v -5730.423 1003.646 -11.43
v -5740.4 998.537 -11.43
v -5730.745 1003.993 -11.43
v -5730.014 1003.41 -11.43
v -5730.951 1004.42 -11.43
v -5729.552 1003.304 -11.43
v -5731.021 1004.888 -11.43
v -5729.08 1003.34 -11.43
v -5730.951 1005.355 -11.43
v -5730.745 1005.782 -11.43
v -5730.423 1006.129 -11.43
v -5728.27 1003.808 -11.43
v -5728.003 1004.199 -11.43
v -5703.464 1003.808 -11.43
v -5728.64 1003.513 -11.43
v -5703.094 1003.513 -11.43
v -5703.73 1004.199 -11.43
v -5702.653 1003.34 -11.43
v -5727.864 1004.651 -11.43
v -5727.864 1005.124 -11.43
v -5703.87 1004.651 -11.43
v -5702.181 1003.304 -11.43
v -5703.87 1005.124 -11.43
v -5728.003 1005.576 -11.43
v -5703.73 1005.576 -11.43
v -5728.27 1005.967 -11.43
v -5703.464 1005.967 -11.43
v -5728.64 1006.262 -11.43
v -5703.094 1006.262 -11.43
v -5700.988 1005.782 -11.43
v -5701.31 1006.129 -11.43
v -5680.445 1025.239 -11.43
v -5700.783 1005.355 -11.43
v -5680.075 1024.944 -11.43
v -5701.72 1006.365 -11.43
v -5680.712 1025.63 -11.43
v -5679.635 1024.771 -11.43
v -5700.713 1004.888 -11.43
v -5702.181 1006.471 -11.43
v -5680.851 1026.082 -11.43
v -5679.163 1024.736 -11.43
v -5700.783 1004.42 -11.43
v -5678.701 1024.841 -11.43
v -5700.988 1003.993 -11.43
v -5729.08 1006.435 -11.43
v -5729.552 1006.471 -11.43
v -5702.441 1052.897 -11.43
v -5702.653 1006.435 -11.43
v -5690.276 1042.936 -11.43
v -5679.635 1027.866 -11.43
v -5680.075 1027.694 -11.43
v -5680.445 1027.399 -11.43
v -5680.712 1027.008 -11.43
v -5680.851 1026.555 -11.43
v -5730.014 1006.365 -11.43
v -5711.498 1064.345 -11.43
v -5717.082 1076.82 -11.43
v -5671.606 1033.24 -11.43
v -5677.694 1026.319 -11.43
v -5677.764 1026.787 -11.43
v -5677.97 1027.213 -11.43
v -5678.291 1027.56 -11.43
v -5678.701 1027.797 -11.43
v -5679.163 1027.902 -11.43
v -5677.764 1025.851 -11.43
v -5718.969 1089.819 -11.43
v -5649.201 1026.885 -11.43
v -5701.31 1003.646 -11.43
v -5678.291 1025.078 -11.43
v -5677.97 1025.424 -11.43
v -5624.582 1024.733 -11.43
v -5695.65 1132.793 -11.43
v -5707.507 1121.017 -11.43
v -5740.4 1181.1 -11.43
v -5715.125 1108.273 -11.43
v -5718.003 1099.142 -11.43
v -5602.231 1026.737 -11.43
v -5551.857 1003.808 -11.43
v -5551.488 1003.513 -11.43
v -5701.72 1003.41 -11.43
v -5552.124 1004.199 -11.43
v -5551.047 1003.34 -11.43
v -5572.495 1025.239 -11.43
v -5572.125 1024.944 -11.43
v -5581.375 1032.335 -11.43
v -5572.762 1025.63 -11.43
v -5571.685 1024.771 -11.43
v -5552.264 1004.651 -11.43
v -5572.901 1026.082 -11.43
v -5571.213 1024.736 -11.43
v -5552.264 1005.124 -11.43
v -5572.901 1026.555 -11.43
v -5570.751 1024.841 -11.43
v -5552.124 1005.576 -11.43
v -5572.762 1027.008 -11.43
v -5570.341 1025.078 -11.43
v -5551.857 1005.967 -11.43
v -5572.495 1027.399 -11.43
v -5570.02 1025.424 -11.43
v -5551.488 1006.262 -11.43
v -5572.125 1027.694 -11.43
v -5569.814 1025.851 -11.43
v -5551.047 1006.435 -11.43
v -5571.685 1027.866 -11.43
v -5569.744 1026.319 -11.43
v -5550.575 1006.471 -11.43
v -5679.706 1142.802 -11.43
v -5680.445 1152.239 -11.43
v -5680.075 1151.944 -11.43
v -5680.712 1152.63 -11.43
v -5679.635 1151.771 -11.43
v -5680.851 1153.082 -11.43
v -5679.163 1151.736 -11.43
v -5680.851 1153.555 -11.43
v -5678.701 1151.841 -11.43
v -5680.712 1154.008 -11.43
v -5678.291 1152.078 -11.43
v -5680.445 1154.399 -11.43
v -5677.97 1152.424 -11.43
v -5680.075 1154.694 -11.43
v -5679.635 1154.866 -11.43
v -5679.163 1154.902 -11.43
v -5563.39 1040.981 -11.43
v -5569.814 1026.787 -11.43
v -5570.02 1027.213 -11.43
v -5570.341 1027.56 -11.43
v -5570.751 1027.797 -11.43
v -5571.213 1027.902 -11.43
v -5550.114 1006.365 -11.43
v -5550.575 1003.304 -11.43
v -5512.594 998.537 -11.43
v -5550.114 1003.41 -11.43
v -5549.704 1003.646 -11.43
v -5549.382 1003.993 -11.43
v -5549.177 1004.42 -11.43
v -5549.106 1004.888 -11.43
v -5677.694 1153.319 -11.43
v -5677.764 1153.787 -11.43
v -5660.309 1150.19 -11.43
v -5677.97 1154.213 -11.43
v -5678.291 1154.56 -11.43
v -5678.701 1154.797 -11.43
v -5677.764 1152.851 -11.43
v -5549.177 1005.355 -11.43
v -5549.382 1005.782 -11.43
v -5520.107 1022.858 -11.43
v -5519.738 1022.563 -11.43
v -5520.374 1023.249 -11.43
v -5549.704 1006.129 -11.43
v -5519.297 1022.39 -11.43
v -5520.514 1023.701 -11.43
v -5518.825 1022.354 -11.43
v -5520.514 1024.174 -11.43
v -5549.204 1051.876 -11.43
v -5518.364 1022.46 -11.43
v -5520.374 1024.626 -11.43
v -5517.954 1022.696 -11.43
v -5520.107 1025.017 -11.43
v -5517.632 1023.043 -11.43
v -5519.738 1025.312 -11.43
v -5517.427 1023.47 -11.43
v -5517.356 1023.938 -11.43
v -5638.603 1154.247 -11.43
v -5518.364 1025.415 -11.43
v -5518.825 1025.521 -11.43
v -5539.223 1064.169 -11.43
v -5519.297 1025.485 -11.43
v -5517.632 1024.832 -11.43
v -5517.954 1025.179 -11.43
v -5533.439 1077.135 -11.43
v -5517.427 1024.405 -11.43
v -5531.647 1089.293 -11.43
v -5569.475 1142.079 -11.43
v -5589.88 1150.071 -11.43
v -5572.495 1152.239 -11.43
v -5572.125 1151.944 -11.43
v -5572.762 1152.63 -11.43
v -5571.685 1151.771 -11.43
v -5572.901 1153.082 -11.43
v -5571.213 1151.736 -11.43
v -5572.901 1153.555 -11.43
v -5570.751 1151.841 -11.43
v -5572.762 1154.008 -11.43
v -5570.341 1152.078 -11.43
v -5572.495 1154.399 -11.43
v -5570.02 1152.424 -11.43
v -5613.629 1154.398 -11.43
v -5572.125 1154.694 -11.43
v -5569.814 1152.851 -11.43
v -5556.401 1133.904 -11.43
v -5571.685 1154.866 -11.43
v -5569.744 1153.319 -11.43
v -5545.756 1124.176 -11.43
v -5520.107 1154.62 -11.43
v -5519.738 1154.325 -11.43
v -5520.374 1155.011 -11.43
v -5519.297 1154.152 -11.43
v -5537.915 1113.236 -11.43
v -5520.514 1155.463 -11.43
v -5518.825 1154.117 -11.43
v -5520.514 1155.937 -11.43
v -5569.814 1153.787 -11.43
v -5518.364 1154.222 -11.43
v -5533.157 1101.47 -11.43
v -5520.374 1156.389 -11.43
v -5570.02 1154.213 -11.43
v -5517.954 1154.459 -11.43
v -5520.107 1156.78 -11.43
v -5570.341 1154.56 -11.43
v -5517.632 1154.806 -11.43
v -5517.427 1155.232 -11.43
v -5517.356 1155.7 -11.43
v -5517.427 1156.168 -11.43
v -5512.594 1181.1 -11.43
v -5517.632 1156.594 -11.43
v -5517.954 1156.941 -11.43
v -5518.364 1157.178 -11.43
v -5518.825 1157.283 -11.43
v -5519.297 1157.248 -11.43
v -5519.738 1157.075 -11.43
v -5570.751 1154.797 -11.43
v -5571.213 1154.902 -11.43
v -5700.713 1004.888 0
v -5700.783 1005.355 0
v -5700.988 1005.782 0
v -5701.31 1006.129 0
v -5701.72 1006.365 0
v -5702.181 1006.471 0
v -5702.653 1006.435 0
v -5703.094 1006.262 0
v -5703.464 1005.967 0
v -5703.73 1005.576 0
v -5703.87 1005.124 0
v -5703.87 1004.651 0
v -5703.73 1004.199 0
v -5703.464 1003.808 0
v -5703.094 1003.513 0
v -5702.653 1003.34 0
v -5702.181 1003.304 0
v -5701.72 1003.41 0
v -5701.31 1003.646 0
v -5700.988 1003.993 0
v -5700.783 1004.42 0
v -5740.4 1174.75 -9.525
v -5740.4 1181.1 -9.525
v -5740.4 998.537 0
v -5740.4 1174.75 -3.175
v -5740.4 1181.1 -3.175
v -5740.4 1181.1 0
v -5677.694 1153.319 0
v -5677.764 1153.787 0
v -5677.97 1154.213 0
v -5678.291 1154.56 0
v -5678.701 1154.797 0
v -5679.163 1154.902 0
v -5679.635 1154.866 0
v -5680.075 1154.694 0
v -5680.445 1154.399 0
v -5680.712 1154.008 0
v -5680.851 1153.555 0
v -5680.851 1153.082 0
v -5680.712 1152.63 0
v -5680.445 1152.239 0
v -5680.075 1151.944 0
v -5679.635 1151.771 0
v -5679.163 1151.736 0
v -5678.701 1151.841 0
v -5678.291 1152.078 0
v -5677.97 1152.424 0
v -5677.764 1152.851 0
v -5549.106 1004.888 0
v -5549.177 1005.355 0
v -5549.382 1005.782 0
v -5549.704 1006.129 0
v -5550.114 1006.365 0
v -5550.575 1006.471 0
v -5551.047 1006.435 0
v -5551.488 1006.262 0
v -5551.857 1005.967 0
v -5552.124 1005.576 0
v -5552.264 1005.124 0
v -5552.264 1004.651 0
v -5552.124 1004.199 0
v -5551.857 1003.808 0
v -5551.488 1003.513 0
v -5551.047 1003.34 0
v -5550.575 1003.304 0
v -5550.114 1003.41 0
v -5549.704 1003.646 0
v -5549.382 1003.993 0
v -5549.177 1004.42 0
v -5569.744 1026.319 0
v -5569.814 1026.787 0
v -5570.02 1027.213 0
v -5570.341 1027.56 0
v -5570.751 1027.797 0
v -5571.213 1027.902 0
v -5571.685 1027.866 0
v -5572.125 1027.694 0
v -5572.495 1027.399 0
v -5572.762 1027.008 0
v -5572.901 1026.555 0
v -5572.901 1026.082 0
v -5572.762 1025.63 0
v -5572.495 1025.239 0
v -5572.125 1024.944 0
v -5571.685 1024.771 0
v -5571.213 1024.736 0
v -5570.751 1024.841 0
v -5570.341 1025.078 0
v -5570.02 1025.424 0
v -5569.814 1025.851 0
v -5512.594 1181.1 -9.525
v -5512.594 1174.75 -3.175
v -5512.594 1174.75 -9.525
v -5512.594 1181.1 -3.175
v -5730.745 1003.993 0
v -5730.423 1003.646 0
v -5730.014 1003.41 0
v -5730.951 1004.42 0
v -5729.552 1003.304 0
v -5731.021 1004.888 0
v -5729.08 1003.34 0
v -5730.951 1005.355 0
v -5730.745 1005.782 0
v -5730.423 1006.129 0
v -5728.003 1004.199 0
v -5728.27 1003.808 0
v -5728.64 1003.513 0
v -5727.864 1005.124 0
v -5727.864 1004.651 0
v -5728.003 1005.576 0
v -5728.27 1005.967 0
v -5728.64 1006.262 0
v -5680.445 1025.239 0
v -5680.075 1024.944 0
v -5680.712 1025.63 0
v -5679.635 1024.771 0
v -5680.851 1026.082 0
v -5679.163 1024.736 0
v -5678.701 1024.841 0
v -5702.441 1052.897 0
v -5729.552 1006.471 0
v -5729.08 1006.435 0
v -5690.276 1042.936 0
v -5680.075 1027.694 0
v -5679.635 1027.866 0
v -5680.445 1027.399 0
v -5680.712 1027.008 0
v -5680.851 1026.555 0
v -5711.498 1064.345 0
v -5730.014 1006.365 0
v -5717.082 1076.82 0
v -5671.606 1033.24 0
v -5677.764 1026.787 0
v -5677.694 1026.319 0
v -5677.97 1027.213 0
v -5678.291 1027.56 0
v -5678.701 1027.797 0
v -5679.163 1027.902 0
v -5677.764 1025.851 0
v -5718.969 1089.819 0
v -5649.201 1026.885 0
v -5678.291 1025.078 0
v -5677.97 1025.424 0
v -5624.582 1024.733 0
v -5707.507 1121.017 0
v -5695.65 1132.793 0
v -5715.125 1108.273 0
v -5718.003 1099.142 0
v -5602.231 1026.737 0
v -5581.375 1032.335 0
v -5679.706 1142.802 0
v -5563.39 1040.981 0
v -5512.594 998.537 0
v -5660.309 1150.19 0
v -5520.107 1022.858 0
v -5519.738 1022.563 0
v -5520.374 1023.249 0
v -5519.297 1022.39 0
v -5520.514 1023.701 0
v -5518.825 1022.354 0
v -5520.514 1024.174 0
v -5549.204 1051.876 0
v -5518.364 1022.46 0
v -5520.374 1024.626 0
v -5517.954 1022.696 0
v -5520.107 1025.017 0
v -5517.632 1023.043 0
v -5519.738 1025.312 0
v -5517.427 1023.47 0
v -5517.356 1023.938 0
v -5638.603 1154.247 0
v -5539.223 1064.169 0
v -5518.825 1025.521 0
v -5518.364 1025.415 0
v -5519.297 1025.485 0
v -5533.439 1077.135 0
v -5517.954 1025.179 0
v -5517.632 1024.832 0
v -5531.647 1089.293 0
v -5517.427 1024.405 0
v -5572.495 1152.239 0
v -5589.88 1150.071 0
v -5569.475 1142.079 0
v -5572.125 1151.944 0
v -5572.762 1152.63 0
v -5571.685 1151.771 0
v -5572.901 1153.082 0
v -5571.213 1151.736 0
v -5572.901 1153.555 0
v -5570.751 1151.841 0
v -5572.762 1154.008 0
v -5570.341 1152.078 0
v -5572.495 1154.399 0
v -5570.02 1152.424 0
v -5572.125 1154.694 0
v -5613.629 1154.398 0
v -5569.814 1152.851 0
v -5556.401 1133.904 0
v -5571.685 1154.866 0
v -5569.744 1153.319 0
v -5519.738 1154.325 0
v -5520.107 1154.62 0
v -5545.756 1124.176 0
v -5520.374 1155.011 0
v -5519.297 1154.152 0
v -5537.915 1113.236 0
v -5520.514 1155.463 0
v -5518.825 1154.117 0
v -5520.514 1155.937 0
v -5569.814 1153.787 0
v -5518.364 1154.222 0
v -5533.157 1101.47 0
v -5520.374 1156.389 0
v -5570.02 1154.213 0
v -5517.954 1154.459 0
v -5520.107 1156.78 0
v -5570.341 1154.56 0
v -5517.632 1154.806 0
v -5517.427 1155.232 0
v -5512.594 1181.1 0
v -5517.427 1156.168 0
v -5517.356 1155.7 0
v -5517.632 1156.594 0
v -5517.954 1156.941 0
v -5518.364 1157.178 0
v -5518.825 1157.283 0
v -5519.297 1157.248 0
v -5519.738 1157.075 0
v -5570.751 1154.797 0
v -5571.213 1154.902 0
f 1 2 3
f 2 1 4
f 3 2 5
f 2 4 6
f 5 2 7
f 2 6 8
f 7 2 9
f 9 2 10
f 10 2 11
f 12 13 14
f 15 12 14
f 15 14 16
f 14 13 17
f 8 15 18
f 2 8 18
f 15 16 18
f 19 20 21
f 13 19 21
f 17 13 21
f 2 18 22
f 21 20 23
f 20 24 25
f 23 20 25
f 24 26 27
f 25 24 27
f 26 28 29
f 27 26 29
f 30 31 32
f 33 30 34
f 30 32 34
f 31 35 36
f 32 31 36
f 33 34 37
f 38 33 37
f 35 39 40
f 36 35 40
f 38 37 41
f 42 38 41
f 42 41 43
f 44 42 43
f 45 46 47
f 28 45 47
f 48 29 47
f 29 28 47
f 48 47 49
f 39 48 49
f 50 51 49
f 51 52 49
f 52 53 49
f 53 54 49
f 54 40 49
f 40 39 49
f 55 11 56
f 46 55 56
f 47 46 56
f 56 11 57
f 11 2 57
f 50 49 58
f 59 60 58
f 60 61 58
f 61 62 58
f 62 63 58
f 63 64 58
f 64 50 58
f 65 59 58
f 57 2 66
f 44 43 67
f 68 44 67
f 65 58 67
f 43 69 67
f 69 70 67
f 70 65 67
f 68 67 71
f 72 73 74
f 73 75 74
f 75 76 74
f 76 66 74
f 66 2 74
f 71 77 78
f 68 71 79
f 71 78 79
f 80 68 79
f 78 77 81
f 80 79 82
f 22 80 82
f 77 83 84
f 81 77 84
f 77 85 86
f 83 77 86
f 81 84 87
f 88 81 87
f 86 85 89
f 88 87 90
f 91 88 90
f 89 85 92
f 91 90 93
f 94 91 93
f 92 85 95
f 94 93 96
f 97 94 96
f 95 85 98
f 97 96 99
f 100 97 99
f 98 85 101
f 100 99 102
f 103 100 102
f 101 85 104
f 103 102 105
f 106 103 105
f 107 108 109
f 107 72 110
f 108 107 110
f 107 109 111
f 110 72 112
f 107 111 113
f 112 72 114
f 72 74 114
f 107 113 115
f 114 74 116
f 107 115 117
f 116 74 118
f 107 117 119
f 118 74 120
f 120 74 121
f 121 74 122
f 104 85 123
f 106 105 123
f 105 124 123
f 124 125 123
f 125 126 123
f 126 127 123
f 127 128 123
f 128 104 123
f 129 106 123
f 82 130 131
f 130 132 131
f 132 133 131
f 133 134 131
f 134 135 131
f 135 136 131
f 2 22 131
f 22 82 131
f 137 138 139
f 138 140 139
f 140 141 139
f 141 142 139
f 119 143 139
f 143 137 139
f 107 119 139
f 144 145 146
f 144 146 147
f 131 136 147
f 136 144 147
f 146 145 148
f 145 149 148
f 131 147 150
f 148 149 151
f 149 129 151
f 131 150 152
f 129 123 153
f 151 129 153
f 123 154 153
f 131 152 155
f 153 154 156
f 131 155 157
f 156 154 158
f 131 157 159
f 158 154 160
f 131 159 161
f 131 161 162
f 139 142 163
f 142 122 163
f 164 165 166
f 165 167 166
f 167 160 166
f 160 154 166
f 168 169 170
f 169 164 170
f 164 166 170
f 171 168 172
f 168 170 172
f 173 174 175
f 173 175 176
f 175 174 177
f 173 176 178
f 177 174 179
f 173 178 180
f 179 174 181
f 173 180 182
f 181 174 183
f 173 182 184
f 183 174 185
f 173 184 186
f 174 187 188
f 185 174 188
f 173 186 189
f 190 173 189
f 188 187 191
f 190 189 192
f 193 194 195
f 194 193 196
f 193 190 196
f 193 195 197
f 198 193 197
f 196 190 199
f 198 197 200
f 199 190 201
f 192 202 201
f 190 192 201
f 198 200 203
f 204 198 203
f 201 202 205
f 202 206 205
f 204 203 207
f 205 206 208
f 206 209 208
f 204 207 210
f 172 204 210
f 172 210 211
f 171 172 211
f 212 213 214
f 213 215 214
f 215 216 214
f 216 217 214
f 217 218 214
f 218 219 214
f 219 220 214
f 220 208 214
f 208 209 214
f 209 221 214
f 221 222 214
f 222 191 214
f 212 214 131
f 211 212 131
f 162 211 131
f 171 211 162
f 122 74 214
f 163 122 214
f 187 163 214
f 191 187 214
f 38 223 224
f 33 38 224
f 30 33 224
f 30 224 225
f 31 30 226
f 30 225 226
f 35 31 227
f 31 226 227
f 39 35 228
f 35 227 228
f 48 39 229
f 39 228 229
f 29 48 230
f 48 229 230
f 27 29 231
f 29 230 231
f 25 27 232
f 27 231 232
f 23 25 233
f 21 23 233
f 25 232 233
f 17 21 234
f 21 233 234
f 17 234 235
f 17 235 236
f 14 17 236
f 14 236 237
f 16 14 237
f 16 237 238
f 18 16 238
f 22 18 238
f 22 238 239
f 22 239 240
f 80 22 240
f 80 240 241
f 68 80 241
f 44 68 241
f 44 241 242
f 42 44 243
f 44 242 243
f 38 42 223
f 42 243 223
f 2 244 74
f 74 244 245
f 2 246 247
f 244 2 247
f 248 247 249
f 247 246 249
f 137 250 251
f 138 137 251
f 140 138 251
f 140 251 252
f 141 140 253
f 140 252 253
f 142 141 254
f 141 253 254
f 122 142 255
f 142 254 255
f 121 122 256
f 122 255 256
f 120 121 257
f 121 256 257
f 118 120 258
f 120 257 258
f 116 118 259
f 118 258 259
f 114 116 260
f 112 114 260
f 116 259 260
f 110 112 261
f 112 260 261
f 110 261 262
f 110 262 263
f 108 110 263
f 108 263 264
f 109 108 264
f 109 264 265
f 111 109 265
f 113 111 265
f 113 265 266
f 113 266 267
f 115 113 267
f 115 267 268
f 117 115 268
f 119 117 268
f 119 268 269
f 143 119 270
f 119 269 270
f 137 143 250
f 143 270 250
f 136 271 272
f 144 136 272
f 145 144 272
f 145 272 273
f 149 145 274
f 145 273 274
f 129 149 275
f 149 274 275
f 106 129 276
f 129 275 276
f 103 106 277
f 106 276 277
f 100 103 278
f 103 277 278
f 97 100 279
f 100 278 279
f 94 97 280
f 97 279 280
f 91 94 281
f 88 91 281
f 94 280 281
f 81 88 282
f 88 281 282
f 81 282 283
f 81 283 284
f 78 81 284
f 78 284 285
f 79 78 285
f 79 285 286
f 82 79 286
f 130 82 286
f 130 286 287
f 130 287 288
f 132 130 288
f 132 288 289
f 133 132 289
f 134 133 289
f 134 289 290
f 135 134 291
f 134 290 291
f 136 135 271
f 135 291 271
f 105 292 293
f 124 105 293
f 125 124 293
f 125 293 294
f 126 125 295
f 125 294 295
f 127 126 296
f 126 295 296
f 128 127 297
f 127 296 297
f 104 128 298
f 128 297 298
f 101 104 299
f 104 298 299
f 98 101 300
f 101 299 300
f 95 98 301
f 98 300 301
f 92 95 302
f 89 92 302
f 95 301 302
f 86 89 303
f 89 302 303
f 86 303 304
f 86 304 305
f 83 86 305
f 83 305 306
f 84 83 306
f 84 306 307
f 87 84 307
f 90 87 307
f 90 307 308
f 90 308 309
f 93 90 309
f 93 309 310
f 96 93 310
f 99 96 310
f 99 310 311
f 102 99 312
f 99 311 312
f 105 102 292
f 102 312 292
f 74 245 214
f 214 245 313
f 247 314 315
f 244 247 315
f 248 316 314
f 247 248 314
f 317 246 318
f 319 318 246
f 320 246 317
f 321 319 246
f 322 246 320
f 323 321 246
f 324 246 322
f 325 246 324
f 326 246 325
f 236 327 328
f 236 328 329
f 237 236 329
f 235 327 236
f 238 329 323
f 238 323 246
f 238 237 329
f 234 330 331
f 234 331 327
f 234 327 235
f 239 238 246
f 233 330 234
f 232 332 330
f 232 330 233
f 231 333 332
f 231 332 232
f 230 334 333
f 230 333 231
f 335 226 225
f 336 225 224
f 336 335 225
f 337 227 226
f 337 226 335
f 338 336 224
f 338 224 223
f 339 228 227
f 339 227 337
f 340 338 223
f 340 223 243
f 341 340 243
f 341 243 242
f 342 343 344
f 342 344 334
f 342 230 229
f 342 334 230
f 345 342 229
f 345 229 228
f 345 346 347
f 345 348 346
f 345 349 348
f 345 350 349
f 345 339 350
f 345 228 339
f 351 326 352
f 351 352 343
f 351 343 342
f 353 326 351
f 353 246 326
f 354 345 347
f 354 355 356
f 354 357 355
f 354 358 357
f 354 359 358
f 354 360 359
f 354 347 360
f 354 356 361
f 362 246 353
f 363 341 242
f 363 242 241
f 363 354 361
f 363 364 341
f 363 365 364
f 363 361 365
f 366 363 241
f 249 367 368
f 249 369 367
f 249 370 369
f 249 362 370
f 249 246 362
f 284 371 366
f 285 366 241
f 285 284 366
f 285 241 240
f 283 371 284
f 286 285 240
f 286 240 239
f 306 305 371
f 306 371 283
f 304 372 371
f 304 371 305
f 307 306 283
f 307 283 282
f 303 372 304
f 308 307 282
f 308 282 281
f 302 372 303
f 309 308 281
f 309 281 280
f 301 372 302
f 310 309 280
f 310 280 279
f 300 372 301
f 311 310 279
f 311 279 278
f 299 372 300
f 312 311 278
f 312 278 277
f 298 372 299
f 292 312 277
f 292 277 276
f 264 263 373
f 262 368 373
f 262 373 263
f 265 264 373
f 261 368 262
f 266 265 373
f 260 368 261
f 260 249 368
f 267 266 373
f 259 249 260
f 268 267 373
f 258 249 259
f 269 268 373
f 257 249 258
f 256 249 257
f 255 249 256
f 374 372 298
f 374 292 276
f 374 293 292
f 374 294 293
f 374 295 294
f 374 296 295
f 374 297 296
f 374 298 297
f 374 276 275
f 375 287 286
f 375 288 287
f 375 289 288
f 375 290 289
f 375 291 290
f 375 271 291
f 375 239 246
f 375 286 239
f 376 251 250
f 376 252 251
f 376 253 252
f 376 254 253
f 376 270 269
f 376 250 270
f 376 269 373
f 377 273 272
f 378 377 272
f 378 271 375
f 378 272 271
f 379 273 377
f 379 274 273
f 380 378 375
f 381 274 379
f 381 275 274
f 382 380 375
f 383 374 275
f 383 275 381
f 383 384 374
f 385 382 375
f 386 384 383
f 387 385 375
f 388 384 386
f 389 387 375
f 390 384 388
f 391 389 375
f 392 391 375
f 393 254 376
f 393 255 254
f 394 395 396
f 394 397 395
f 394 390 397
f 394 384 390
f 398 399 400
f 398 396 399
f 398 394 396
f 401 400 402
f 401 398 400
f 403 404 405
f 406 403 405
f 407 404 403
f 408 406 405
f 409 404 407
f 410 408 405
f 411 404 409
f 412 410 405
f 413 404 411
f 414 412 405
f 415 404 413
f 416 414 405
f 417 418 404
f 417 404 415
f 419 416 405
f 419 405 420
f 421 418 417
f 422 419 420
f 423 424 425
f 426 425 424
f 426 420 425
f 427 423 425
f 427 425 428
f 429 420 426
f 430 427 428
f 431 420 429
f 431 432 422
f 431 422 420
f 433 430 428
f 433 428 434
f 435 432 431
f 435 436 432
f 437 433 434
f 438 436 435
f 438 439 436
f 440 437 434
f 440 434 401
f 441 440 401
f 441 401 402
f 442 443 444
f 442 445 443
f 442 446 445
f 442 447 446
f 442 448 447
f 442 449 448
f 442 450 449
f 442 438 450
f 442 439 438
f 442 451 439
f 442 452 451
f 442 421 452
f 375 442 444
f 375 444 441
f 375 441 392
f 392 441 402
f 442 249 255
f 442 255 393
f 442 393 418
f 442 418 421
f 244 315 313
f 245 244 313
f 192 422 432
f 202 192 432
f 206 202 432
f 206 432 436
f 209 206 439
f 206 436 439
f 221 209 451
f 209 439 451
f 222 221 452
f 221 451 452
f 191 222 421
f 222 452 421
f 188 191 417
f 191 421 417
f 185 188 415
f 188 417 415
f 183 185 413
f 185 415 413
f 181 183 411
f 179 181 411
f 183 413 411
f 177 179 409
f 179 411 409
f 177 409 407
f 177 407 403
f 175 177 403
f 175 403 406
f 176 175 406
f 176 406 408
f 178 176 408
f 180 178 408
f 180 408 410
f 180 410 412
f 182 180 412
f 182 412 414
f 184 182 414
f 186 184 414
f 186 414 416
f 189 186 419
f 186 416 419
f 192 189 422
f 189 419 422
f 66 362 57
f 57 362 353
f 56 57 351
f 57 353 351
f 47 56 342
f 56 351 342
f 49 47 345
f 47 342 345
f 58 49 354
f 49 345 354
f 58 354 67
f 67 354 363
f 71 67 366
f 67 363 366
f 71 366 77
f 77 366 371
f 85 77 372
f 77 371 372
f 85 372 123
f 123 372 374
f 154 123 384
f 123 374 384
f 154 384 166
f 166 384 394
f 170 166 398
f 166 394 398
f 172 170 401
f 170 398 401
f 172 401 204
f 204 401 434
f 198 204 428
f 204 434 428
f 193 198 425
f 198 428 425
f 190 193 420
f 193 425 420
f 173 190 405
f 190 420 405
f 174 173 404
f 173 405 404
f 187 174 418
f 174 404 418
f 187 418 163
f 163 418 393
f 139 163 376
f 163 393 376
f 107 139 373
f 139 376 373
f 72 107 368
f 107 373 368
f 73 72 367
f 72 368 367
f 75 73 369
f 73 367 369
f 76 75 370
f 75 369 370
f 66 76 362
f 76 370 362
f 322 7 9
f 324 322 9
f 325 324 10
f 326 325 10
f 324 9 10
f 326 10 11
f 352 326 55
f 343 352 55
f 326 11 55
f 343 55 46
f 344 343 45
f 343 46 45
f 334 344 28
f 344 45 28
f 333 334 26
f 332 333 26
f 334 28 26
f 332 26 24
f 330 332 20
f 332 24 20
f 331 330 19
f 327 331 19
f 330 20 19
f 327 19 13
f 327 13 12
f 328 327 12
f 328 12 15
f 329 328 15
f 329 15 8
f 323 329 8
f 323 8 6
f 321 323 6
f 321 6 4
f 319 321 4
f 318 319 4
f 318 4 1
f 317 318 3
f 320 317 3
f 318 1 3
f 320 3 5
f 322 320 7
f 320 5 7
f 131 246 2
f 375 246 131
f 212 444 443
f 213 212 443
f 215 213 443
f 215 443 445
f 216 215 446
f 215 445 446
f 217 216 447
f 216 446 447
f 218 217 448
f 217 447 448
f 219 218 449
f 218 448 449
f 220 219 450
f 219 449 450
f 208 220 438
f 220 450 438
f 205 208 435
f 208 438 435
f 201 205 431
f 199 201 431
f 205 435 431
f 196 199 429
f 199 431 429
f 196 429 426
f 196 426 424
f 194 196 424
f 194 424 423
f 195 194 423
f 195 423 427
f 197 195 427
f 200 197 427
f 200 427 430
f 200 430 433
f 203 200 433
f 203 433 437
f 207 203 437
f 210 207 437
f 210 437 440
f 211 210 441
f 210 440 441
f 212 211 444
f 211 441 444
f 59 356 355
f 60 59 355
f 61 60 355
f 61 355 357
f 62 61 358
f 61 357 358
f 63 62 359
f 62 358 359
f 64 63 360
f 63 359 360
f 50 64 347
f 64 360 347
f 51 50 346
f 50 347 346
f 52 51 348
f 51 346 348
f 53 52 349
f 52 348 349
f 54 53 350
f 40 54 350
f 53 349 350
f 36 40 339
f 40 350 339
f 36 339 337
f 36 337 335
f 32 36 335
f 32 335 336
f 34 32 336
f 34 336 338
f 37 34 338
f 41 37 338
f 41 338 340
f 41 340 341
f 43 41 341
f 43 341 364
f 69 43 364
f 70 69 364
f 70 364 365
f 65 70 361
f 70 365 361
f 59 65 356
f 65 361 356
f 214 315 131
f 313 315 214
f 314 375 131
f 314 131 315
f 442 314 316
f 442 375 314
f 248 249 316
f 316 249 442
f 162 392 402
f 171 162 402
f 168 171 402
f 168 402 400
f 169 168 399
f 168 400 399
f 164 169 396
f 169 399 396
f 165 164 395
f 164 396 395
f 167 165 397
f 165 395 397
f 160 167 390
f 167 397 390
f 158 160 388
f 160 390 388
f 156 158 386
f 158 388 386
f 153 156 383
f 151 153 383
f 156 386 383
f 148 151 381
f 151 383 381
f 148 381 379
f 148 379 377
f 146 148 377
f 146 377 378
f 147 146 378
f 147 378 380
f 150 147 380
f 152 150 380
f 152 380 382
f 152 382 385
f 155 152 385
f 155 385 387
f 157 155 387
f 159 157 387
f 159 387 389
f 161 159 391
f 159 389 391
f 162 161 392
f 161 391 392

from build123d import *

# Parameters (mm, degrees)
SPEAKERMOUNTING_W               = 227.80625
SPEAKERMOUNTING_H               = 182.5625
SPEAKERMOUNTING_THICKNESS_DEPTH = 11.43
SPEAKERCUTOUT_R                 = 1.5875
SPEAKERCUTOUT_RX                = 93.6625
SPEAKERCUTOUT_RY                = 65.087499997
CUT_EXTRUDE1_DEPTH              = 11.43
CUT_EXTRUDE2_DEPTH              = 227.80625
SKETCH2_R                       = 1.5875
CUT_EXTRUDE3_DEPTH              = 11.43


with BuildPart() as part:
    # SpeakerMounting → SpeakerMounting_Thickness (new body)
    with BuildSketch(Plane.XY):
        with Locations((-5626.496875, 1089.81875)):
            Rectangle(SPEAKERMOUNTING_W, SPEAKERMOUNTING_H)
    extrude(amount=-SPEAKERMOUNTING_THICKNESS_DEPTH)

    # SpeakerCutout → Cut-Extrude1 (cut)
    with BuildSketch(Plane.XY):
        with Locations((-5571.33125, 1153.31875)):
            Circle(SPEAKERCUTOUT_R)
        with Locations((-5518.94375, 1155.7)):
            Circle(SPEAKERCUTOUT_R)
        with Locations((-5518.94375, 1023.9375)):
            Circle(SPEAKERCUTOUT_R)
        with Locations((-5550.69375, 1004.8875)):
            Circle(SPEAKERCUTOUT_R)
        with Locations((-5571.33125, 1026.31875)):
            Circle(SPEAKERCUTOUT_R)
        with Locations((-5679.28125, 1026.31875)):
            Circle(SPEAKERCUTOUT_R)
        with Locations((-5702.3, 1004.8875)):
            Circle(SPEAKERCUTOUT_R)
        with Locations((-5679.28125, 1153.31875)):
            Circle(SPEAKERCUTOUT_R)
        with Locations(Location((-5625.30625, 1089.81875), (0, 0, 180))):
            Ellipse(SPEAKERCUTOUT_RX, SPEAKERCUTOUT_RY)
    extrude(amount=-CUT_EXTRUDE1_DEPTH, mode=Mode.SUBTRACT)

    # SpeakerSlotForScreen → Cut-Extrude2 (cut)
    with BuildSketch(Plane(origin=(-5512.59375, 0, 0), x_dir=(0, 0, -1), z_dir=(1, 0, 0))):
        Polygon((5.715, 1181.1), (3.175, 1181.1), (3.175, 1174.75), (9.525, 1174.75), (9.525, 1181.1), align=None)
    extrude(amount=-CUT_EXTRUDE2_DEPTH, mode=Mode.SUBTRACT)

    # Sketch2 → Cut-Extrude3 (cut)
    with BuildSketch(Plane(origin=(0, 0, -11.43), x_dir=(-1, 0, 0), z_dir=(0, 0, -1))):
        with Locations((5729.43355, 1004.8875)):
            Circle(SKETCH2_R)
    extrude(amount=-CUT_EXTRUDE3_DEPTH, mode=Mode.SUBTRACT)


solid = part.part
